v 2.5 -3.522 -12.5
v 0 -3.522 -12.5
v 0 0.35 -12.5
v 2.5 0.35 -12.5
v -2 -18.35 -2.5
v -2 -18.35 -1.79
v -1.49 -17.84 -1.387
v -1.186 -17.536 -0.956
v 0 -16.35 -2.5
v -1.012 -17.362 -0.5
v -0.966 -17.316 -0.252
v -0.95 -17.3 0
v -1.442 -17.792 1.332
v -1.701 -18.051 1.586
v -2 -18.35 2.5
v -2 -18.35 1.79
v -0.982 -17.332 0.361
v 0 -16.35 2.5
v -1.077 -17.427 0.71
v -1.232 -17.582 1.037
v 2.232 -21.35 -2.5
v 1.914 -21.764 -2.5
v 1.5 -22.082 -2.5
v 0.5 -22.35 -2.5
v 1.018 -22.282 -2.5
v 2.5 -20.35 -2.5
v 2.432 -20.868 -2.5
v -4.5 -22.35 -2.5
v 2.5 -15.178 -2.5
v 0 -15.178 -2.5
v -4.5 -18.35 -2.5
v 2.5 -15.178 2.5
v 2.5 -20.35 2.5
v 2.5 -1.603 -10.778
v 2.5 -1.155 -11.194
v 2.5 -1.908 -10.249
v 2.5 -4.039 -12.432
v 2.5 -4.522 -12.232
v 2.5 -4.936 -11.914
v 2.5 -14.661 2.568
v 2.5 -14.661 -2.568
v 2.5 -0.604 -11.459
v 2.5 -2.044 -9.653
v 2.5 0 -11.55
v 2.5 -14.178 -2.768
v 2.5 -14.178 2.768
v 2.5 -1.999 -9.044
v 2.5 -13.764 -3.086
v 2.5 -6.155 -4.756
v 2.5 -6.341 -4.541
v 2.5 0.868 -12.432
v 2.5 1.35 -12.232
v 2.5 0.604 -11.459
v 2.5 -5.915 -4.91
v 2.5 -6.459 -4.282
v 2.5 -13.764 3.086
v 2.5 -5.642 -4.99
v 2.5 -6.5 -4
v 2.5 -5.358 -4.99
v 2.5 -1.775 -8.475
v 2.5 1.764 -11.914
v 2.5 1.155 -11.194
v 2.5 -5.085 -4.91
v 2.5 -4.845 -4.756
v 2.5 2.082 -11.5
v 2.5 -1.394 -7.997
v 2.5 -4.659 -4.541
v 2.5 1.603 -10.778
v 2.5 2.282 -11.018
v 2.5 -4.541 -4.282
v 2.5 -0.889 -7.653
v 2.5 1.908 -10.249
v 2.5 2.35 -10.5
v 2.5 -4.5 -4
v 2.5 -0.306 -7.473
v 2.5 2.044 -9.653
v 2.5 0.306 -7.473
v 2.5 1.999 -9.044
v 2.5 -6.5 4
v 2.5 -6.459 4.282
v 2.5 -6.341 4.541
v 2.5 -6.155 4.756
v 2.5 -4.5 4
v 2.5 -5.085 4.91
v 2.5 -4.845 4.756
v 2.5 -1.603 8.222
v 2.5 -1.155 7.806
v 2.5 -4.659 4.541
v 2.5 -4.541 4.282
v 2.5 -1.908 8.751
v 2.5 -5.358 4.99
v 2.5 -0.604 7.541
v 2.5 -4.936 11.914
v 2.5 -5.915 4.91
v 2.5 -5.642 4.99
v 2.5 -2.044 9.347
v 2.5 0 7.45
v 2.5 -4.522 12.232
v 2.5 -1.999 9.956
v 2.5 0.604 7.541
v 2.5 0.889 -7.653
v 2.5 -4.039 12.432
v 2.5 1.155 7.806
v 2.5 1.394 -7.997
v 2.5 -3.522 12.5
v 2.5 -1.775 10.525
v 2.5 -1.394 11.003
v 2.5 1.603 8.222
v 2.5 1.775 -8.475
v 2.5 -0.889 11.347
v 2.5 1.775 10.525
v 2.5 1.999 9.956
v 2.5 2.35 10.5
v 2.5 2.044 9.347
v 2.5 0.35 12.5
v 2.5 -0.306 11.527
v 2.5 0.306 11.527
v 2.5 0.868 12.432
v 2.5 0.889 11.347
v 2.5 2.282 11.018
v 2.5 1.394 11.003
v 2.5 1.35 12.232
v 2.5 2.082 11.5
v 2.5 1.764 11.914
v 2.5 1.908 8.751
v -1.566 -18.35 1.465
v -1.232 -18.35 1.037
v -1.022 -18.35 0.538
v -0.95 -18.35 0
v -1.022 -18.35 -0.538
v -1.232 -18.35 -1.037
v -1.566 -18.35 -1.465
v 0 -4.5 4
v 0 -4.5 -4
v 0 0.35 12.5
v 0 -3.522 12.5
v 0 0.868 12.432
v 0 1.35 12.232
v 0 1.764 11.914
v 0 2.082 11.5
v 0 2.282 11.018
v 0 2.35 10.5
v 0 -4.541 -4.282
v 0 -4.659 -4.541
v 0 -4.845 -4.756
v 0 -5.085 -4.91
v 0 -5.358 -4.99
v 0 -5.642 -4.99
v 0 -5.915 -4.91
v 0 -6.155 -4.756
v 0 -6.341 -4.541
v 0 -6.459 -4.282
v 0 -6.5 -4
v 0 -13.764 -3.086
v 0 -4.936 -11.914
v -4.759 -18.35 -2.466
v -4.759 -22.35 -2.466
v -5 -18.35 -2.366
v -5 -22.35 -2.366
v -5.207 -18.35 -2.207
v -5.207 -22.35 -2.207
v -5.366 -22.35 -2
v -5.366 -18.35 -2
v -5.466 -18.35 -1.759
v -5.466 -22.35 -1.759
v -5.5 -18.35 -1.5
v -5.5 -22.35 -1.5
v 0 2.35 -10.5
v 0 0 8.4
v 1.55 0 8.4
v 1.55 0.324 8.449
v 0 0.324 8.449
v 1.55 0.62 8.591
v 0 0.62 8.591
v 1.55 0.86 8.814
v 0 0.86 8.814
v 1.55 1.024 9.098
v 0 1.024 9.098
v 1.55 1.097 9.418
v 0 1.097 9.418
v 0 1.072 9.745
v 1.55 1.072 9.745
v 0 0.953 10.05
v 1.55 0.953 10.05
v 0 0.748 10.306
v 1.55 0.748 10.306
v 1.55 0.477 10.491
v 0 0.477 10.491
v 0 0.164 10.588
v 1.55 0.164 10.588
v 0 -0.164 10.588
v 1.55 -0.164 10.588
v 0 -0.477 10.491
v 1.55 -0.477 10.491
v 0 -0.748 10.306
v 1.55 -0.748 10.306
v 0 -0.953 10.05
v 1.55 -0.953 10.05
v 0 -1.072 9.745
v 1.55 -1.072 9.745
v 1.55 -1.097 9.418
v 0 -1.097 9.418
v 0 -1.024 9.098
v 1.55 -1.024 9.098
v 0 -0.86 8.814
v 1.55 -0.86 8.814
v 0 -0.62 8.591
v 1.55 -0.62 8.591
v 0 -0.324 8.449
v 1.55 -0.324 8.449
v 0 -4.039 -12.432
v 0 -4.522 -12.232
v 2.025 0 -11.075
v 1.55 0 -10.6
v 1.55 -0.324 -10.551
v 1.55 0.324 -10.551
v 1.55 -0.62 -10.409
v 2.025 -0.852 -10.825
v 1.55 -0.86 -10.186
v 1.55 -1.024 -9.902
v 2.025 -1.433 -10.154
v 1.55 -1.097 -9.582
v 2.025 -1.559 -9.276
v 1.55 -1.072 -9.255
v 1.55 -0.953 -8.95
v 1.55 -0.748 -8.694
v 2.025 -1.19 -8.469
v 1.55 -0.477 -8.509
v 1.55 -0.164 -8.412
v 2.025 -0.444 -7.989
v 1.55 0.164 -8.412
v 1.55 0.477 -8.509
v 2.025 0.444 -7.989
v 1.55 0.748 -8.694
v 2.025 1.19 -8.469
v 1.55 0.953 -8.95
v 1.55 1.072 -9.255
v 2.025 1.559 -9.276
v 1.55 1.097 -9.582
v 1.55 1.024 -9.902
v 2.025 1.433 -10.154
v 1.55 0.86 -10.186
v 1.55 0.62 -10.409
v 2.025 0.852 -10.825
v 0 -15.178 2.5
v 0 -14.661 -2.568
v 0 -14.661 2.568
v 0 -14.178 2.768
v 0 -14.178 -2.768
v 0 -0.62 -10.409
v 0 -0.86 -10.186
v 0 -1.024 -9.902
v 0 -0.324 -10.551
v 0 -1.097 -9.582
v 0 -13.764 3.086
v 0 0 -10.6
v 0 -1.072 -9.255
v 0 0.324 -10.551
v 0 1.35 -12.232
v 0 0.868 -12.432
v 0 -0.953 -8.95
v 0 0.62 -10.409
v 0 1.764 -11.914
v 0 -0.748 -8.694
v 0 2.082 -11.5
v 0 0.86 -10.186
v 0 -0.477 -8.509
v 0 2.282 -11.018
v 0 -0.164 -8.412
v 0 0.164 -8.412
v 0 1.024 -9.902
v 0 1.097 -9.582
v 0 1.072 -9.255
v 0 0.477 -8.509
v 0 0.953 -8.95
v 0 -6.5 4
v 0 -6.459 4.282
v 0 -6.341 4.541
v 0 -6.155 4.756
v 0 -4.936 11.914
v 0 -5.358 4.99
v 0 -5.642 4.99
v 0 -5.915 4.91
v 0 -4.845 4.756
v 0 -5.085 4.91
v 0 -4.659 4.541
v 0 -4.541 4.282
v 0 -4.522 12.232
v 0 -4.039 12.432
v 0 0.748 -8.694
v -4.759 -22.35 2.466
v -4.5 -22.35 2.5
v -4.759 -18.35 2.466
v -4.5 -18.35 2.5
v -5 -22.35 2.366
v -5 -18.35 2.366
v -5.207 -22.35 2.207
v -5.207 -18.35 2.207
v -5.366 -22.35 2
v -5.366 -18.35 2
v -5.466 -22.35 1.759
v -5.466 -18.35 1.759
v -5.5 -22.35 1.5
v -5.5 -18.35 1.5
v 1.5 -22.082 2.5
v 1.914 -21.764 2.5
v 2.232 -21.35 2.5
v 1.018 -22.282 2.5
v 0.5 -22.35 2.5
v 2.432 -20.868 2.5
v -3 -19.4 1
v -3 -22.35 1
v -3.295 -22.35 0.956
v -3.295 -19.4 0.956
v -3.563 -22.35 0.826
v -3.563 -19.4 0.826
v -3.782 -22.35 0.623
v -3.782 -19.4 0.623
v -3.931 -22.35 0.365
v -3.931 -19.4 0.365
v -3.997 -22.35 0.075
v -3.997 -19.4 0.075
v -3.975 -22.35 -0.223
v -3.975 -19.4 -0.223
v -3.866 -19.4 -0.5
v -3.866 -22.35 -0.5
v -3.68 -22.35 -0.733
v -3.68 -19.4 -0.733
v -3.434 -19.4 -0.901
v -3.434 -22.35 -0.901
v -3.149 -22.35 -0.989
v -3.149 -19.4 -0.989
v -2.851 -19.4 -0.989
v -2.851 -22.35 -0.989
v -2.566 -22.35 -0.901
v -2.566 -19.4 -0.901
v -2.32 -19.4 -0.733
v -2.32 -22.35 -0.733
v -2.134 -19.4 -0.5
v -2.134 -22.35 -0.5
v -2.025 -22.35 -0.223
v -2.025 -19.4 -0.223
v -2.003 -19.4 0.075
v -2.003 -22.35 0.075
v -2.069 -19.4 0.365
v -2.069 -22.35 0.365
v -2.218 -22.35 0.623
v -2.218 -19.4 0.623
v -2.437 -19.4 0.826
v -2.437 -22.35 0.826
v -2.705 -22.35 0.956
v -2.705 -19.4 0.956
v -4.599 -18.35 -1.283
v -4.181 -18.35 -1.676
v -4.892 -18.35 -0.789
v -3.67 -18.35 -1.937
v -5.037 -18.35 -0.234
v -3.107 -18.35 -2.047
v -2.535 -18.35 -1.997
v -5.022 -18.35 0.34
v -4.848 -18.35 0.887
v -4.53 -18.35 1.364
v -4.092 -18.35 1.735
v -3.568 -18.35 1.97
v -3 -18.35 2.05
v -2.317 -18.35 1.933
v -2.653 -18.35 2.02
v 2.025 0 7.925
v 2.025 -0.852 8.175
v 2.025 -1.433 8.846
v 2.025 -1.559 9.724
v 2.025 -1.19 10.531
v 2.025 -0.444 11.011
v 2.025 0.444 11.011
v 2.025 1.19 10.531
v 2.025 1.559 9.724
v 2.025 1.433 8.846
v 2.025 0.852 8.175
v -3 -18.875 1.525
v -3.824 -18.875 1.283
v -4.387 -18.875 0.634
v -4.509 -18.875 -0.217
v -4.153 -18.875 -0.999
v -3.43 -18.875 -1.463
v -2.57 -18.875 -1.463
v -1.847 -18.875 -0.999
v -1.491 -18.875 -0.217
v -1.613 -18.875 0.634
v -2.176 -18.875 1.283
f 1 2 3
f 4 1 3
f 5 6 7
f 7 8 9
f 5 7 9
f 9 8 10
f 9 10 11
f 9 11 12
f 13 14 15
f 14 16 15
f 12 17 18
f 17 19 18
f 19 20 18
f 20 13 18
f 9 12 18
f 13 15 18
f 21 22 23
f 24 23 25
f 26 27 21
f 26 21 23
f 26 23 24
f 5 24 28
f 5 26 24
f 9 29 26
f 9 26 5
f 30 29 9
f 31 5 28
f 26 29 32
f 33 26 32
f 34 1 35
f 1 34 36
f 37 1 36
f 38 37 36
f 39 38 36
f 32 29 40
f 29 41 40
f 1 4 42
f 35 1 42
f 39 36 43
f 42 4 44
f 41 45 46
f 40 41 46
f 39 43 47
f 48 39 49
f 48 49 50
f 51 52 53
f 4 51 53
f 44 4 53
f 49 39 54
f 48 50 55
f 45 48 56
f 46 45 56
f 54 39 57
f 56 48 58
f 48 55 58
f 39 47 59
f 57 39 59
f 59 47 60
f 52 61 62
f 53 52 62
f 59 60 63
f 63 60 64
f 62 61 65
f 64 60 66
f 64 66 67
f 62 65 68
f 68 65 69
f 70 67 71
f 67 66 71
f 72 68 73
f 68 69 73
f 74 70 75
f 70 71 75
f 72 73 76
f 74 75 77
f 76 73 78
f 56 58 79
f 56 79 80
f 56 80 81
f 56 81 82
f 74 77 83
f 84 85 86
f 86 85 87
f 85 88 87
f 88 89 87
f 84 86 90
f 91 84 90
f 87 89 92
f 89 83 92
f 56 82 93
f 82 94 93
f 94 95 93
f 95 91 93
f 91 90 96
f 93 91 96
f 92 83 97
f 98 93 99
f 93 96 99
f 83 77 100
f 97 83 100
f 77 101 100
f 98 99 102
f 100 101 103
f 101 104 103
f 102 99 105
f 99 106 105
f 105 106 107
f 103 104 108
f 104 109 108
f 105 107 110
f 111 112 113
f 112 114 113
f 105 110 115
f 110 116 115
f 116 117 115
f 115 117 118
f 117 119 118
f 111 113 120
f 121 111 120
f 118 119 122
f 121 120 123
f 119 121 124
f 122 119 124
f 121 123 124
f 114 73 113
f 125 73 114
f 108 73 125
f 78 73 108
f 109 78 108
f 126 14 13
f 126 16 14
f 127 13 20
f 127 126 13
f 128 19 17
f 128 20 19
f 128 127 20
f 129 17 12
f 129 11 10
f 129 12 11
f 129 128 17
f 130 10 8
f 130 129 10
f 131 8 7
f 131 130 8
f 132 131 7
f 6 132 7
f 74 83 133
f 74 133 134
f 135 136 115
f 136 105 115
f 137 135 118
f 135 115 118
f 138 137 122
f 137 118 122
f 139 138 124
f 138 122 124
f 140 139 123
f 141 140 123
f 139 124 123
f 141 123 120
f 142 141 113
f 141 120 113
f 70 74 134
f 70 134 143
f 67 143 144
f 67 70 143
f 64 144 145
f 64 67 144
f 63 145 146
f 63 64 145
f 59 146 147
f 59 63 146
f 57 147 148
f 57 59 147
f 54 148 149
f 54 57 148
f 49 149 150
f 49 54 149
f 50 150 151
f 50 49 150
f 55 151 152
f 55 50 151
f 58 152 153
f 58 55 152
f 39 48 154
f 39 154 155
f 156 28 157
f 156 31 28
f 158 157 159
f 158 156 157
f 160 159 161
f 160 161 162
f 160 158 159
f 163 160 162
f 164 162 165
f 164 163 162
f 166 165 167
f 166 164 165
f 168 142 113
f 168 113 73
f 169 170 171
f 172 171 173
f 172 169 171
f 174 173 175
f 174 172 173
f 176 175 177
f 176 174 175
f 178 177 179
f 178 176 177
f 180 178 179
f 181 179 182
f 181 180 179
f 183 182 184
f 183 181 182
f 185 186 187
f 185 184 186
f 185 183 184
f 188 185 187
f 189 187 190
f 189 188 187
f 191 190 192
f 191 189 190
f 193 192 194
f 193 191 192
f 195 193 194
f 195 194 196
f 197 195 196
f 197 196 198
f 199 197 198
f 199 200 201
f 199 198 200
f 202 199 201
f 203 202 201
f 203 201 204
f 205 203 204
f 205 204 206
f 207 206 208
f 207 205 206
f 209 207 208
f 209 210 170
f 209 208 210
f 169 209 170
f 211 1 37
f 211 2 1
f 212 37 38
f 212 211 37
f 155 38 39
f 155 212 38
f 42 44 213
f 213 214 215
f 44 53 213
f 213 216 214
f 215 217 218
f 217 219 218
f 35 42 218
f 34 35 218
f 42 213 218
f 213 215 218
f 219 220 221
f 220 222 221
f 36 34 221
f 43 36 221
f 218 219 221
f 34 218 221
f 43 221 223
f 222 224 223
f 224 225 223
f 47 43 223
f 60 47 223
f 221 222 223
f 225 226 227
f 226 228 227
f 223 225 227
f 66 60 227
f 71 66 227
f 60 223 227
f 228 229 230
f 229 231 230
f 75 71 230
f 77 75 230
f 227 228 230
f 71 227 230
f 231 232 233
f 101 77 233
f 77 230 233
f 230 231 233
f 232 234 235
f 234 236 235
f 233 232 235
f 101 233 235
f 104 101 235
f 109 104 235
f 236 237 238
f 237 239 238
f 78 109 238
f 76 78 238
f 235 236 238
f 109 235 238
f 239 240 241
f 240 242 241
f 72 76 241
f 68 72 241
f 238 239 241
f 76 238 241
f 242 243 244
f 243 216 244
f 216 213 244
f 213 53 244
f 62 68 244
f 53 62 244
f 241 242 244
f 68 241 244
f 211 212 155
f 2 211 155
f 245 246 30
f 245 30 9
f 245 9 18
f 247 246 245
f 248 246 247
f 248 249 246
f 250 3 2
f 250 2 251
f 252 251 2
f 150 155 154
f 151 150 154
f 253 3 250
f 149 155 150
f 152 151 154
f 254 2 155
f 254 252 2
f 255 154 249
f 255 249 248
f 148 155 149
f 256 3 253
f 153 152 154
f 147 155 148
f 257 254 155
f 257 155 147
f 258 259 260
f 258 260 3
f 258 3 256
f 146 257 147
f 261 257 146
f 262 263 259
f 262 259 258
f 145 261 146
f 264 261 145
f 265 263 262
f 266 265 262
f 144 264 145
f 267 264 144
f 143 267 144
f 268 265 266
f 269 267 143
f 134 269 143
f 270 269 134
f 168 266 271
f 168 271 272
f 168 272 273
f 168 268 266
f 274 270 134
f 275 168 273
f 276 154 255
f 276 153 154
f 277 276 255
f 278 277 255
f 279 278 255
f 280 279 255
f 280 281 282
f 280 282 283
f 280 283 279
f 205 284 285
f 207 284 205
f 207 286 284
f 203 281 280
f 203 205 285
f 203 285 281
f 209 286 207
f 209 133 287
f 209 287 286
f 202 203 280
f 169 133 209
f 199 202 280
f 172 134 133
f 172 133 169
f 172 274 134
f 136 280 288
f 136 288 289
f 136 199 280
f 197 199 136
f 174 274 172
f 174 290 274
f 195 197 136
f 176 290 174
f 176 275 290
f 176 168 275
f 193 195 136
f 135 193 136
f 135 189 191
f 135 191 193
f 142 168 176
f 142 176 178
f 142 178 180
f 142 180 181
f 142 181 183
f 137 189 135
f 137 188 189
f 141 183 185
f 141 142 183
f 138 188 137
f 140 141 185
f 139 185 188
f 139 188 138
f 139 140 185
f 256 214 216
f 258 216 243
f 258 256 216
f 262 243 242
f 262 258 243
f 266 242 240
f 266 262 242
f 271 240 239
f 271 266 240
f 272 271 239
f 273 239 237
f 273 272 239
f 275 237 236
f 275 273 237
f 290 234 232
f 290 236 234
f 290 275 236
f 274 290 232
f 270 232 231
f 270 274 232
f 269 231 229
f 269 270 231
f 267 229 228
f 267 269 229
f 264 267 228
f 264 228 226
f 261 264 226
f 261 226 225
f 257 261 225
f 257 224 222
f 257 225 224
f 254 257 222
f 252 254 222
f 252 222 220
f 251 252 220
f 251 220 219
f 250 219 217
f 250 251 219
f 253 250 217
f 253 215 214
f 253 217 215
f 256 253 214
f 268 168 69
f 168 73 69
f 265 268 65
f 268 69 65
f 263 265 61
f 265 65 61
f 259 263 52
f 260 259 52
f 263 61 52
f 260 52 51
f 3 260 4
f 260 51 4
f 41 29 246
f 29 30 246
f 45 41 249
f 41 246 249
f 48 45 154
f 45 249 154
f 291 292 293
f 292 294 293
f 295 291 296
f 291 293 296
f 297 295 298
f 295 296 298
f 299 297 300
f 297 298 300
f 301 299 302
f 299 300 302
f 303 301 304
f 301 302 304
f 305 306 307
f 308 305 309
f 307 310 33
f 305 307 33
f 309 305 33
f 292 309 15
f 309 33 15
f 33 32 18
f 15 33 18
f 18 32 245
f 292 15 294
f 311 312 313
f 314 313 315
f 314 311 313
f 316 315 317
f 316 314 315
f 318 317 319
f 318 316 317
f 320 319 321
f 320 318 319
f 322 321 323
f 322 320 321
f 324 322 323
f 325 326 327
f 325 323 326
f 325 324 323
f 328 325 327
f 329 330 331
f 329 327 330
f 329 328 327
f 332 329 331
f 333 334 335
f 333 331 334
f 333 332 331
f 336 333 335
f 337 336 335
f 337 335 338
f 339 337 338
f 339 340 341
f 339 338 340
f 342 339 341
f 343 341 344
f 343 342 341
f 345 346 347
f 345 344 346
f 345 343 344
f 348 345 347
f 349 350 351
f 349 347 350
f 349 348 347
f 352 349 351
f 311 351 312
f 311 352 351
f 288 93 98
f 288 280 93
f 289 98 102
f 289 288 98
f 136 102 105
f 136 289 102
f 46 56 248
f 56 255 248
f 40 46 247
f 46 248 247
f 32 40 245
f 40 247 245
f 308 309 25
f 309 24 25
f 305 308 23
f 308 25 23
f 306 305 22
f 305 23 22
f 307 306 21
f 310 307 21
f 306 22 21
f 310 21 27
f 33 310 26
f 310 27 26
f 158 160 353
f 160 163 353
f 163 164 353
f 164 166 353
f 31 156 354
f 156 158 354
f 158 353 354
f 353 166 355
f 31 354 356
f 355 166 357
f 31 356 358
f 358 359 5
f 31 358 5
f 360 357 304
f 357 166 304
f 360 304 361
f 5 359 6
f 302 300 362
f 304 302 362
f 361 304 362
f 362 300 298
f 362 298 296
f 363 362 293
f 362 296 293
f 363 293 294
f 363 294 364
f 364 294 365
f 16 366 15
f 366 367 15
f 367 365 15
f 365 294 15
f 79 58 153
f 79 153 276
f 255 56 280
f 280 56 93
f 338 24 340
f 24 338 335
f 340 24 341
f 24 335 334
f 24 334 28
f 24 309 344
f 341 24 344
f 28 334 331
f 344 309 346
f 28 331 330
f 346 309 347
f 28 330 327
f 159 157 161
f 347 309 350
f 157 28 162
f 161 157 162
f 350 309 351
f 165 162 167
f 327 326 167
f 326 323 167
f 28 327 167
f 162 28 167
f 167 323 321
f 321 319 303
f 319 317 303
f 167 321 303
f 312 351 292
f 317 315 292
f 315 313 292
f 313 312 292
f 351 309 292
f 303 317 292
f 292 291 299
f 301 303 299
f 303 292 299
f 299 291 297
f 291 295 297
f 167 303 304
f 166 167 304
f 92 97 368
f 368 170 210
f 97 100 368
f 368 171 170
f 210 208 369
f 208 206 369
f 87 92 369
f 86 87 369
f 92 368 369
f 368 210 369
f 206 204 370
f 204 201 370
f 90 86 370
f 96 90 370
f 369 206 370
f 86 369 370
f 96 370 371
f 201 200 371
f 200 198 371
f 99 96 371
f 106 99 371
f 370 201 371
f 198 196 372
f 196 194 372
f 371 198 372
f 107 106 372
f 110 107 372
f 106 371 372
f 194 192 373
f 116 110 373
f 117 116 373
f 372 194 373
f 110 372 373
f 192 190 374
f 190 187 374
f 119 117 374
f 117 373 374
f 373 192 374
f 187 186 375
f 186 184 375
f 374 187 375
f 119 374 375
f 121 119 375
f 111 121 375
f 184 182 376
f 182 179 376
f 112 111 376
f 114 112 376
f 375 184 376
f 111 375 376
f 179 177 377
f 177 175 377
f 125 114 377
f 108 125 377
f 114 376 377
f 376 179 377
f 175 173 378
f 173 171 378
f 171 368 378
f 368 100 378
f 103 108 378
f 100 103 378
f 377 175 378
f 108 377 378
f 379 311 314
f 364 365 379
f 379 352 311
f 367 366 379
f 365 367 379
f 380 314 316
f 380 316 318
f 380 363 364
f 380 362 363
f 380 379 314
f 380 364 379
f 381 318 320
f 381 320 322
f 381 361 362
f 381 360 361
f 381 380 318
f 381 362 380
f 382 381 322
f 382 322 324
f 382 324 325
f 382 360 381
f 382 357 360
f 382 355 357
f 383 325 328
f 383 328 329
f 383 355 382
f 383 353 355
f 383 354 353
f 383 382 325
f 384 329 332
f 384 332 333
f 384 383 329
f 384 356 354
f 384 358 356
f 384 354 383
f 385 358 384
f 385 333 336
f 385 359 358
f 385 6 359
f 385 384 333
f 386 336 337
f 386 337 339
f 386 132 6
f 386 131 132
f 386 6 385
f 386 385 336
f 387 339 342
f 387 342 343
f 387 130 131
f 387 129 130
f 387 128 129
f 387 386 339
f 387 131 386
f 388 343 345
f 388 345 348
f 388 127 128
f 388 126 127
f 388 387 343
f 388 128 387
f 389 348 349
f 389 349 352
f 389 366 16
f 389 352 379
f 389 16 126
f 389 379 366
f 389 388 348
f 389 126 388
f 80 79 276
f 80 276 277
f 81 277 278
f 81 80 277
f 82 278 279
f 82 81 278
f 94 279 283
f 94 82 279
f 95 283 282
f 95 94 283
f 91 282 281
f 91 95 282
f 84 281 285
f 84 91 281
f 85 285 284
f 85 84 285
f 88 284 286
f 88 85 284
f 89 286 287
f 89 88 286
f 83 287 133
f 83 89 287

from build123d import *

# Parameters (mm, degrees)
SKETCH_1_W                   = 25
SKETCH_1_H                   = 4.7
SKETCH_1_R                   = 1.1
EXTRUDE_1_DEPTH              = 2.5
HOLE_WIZARD_M2_1_D           = 2
HOLE_WIZARD_M2_1_CSINK_D     = 4.1
HOLE_WIZARD_M2_1_CSINK_ANGLE = 90
EXTRUDE_2_DEPTH              = 2.5
SKETCH1_R                    = 0.85
EXTRUDE1_DEPTH               = 10
SKETCH3_R                    = 2.05
EXTRUDE2_DEPTH               = 10
EXTRUDE4_DEPTH               = 2.5
EXTRUDE5_DEPTH               = 10
FILLET1_R                    = 2
FILLET2_R                    = 1
FILLET3_R                    = 2


with BuildPart() as part:
    # 草图1 → 凸台-拉伸1 (new body)
    with BuildSketch(Plane(origin=(0, 0, 0), x_dir=(0, 0, -1), z_dir=(1, 0, 0))):
        Rectangle(SKETCH_1_W, SKETCH_1_H)
        with Locations((9.5, 0)):
            Circle(SKETCH_1_R, mode=Mode.SUBTRACT)
        with Locations((-9.5, 0)):
            Circle(SKETCH_1_R, mode=Mode.SUBTRACT)
    extrude(amount=EXTRUDE_1_DEPTH)

    # M2 平头机械螺钉的锥形沉头孔1 (through all)
    with Locations(Plane(origin=(2.5, 0, 9.5), x_dir=(0, 0, 1), z_dir=(1, 0, 0))):
        with Locations((0, 0), (-19, 0)):
            CounterSinkHole(HOLE_WIZARD_M2_1_D / 2, HOLE_WIZARD_M2_1_CSINK_D / 2, counter_sink_angle=HOLE_WIZARD_M2_1_CSINK_ANGLE)

    # 草图3 → 凸台-拉伸2 (add, symmetric)
    with BuildSketch(Plane.XY):
        Polygon((0, -2.35), (2.5, -2.35), (2.5, -22.35), (-5.5, -22.35), (-5.5, -18.35), (-2, -18.35), (0, -16.35), align=None)
    extrude(amount=EXTRUDE_2_DEPTH, both=True)

    # Sketch1 → Extrude1 (cut)
    with BuildSketch(Plane(origin=(0, -18.35, 0), x_dir=(1, 0, 0), z_dir=(0, 1, 0))):
        with Locations(Location((-3, 0, 0), (0, 0, 270))):  # turned: the seam where the file's is
            Circle(SKETCH1_R)
    extrude(amount=-EXTRUDE1_DEPTH, mode=Mode.SUBTRACT)

    # Sketch2 → CSK for M2 Flat Head Machine Screw1 (revolve, cut)
    with BuildSketch(Plane(origin=(-3, -18.35, 0), x_dir=(0, 0, 1), z_dir=(1, 0, 0))):
        Polygon((0, 0), (0, 4.000025), (1, 4.000025), (1, 1.05), (2.05, 0), align=None)
    revolve(axis=Axis((-3, -12, 0), (0, -1, 0)), mode=Mode.SUBTRACT)

    # Sketch3 → Extrude2 (cut)
    with BuildSketch(Plane(origin=(0, -18.35, 0), x_dir=(1, 0, 0), z_dir=(0, 1, 0))):
        with Locations((-3, 0)):
            Circle(SKETCH3_R)
    extrude(amount=EXTRUDE2_DEPTH, mode=Mode.SUBTRACT)

    # Sketch6 → Extrude4 (add)
    with BuildSketch(Plane(origin=(2.5, 0, 0), x_dir=(0, 0, -1), z_dir=(1, 0, 0))):
        Polygon((-12.5, -2.35), (-2.5, -2.35), (-2.5, -14.35), (-12.5, -4.35), align=None)
        Polygon((12.5, -4.35), (12.5, -2.35), (2.5, -2.35), (2.5, -14.35), align=None)
    extrude(amount=-EXTRUDE4_DEPTH)

    # Sketch7 → Extrude5 (cut)
    with BuildSketch(Plane(origin=(2.5, 0, 0), x_dir=(0, 0, -1), z_dir=(1, 0, 0))):
        with BuildLine():
            Line((-4, -4.5), (4, -4.5))
            ThreePointArc((4, -4.5), (5, -5.5), (4, -6.5))
            Line((4, -6.5), (-4, -6.5))
            ThreePointArc((-4, -6.5), (-5, -5.5), (-4, -4.5))
        make_face()
    extrude(amount=-EXTRUDE5_DEPTH, mode=Mode.SUBTRACT)

    # Fillet1
    fillet1_edges = [part.edges().sort_by_distance(p)[0] for p in [
        (1.25, -4.35, -12.5),
        (1.25, -14.35, -2.5),
        (1.25, -14.35, 2.5),
        (1.25, -4.35, 12.5),
        (1.25, 2.35, -12.5),
        (1.25, 2.35, 12.5),
    ]]
    fillet(fillet1_edges, radius=FILLET1_R)

    # Fillet2
    fillet2_edges = [part.edges().sort_by_distance(p)[0] for p in [
        (-5.5, -20.35, -2.5),
        (-5.5, -20.35, 2.5),
    ]]
    fillet(fillet2_edges, radius=FILLET2_R)

    # Fillet3
    fillet3_edges = [part.edges().sort_by_distance(p)[0] for p in [
        (2.5, -22.35, 0),
    ]]
    fillet(fillet3_edges, radius=FILLET3_R)


solid = part.part
